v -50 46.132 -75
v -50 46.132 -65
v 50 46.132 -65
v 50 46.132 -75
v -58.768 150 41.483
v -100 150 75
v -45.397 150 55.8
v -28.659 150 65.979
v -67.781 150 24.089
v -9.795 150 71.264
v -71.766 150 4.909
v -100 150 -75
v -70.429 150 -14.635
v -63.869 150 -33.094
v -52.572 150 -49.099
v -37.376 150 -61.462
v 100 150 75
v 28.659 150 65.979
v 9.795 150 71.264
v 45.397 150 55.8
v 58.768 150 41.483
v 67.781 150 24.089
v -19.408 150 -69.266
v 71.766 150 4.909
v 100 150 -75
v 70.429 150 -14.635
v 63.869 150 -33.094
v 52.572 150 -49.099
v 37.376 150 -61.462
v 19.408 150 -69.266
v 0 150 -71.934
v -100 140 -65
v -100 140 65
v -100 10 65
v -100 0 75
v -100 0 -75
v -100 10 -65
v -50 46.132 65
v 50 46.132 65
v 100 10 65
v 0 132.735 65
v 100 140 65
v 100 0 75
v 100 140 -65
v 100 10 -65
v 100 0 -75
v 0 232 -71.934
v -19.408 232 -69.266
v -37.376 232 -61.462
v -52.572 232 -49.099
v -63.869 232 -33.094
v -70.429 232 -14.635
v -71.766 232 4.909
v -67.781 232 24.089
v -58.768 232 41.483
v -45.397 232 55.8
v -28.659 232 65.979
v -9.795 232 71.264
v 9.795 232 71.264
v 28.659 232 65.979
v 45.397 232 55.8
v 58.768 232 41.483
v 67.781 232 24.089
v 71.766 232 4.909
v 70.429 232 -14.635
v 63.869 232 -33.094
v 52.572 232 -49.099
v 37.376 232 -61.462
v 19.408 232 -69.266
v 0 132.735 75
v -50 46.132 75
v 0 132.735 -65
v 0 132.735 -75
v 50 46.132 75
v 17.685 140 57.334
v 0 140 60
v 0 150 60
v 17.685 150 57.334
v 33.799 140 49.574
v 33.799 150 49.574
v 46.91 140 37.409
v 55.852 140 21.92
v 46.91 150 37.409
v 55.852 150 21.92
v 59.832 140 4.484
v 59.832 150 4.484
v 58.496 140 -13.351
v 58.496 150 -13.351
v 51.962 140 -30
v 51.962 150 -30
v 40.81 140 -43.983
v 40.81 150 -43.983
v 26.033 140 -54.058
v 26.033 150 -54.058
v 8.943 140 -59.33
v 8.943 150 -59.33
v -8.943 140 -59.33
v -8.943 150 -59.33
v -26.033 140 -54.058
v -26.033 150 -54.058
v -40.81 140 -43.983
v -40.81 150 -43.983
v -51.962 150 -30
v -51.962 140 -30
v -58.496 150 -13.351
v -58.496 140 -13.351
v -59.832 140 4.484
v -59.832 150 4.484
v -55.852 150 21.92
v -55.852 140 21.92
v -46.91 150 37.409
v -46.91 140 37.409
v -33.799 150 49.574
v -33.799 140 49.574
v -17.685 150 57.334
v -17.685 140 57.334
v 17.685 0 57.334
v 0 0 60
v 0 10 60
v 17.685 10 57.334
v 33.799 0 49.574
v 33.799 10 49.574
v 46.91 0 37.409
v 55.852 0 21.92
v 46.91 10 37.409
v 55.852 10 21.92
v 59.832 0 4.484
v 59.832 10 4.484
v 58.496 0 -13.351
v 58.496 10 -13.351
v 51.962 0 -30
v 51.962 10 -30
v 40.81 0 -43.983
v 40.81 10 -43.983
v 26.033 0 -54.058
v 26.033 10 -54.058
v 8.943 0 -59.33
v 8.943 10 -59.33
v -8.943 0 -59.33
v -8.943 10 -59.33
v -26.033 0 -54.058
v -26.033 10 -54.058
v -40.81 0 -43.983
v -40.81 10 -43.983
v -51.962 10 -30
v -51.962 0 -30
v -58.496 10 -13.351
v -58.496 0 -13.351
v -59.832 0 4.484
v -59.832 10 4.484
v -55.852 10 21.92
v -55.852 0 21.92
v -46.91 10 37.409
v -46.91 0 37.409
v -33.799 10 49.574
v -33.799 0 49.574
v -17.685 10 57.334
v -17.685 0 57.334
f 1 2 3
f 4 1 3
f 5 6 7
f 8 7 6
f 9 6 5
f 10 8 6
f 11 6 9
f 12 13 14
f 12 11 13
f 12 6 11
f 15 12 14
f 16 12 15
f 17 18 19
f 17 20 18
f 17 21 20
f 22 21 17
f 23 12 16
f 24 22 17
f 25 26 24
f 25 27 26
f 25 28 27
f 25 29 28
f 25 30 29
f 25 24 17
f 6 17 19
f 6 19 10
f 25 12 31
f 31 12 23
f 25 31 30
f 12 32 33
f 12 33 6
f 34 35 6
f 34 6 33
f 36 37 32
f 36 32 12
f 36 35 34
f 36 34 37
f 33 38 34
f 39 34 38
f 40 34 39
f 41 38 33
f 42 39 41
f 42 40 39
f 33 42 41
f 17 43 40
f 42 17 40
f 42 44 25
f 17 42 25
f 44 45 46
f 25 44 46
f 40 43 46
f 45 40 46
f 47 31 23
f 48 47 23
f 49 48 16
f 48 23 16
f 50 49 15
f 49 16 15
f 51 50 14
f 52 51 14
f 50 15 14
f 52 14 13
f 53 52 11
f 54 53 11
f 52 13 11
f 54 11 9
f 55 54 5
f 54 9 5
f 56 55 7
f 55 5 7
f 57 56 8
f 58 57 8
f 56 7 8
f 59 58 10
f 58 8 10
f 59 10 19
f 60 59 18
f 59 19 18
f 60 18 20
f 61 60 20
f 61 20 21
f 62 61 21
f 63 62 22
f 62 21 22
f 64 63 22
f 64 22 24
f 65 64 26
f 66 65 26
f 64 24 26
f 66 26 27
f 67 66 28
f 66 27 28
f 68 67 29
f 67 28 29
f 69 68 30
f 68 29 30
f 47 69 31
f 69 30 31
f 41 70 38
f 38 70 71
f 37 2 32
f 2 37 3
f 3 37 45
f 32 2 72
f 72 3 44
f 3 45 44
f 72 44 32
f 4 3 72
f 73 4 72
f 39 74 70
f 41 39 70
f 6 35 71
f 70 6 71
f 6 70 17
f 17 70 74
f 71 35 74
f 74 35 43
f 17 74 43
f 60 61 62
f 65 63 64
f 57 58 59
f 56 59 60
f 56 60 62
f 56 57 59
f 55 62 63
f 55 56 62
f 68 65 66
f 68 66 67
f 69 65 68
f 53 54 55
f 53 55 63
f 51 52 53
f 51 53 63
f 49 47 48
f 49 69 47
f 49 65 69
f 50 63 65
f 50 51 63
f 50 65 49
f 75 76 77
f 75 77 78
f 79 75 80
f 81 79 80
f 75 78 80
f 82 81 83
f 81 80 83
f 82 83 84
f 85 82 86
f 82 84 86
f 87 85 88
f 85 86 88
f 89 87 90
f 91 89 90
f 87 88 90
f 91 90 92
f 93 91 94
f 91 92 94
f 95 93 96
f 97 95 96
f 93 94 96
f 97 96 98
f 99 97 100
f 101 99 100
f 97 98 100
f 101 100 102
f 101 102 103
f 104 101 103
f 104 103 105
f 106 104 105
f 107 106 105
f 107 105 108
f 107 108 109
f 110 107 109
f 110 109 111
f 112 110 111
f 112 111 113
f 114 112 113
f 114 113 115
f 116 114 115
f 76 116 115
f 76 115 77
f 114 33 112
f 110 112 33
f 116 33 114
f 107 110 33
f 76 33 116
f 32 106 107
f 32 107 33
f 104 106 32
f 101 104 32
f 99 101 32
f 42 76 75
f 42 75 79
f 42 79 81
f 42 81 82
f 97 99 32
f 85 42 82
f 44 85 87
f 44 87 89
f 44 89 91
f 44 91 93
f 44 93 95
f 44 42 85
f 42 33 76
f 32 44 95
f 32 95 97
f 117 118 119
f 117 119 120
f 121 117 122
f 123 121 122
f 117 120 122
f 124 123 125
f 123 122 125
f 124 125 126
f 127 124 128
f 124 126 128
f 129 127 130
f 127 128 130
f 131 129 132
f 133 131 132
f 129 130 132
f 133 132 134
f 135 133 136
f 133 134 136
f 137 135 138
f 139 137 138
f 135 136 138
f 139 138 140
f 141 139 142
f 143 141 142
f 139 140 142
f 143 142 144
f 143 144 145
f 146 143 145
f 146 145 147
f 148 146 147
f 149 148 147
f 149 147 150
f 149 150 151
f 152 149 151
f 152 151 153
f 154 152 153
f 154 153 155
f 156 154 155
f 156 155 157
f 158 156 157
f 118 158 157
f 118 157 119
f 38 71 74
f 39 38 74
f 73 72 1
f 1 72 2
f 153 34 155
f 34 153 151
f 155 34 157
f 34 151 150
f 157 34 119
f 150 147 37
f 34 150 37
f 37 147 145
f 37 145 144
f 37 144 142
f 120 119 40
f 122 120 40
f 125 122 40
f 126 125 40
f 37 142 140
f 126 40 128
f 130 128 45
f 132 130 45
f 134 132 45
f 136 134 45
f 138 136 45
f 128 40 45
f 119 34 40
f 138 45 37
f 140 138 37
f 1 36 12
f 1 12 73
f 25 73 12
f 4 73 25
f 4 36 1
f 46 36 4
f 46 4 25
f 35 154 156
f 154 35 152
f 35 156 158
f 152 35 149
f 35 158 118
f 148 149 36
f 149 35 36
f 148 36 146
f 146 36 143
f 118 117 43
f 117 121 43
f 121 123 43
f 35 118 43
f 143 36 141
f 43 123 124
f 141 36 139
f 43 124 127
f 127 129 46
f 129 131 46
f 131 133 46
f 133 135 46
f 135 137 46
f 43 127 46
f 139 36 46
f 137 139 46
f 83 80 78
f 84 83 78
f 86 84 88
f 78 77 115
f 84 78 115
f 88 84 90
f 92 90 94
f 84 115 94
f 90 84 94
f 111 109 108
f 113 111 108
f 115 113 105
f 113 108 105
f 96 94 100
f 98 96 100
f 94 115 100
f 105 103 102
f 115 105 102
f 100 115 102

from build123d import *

# Parameters (mm, degrees)
SKETCH1_W           = 200
SKETCH1_H           = 150
BOSS_EXTRUDE1_DEPTH = 150
CUT_EXTRUDE1_DEPTH  = 235.520787991
SKETCH3_W           = 130
SKETCH3_H           = 130
CUT_EXTRUDE2_DEPTH  = 262.007662723
SKETCH4_R           = 60
CUT_EXTRUDE3_DEPTH  = 196.256241898
SKETCH5_R           = 71.933937191
BOSS_EXTRUDE2_DEPTH = 82


with BuildPart() as part:
    # Sketch1 → Boss-Extrude1 (new body)
    with BuildSketch(Plane(origin=(0, 0, 0), x_dir=(1, 0, 0), z_dir=(0, 1, 0))):
        Rectangle(SKETCH1_W, SKETCH1_H)
    extrude(amount=BOSS_EXTRUDE1_DEPTH)

    # Sketch2 → Cut-Extrude1 (cut, through all)
    with BuildSketch(Plane.XY.offset(75)):
        Polygon((0, 132.735026919), (-50, 46.132486541), (50, 46.132486541), align=None)
    extrude(amount=-CUT_EXTRUDE1_DEPTH, mode=Mode.SUBTRACT)

    # Sketch3 → Cut-Extrude2 (cut, through all)
    with BuildSketch(Plane(origin=(100, 0, 0), x_dir=(0, 0, -1), z_dir=(1, 0, 0))):
        with Locations((0, 75)):
            Rectangle(SKETCH3_W, SKETCH3_H)
    extrude(amount=-CUT_EXTRUDE2_DEPTH, mode=Mode.SUBTRACT)

    # Sketch4 → Cut-Extrude3 (cut, through all)
    with BuildSketch(Plane(origin=(0, 150, 0), x_dir=(1, 0, 0), z_dir=(0, 1, 0))):
        with Locations(Location((0, 0, 0), (0, 0, 270))):
            Circle(SKETCH4_R)
    extrude(amount=-CUT_EXTRUDE3_DEPTH, mode=Mode.SUBTRACT)

    # Sketch5 → Boss-Extrude2 (add)
    with BuildSketch(Plane(origin=(0, 150, 0), x_dir=(1, 0, 0), z_dir=(0, 1, 0))):
        with Locations(Location((0, 0, 0), (0, 0, 90))):
            Circle(SKETCH5_R)
    extrude(amount=BOSS_EXTRUDE2_DEPTH)


solid = part.part
